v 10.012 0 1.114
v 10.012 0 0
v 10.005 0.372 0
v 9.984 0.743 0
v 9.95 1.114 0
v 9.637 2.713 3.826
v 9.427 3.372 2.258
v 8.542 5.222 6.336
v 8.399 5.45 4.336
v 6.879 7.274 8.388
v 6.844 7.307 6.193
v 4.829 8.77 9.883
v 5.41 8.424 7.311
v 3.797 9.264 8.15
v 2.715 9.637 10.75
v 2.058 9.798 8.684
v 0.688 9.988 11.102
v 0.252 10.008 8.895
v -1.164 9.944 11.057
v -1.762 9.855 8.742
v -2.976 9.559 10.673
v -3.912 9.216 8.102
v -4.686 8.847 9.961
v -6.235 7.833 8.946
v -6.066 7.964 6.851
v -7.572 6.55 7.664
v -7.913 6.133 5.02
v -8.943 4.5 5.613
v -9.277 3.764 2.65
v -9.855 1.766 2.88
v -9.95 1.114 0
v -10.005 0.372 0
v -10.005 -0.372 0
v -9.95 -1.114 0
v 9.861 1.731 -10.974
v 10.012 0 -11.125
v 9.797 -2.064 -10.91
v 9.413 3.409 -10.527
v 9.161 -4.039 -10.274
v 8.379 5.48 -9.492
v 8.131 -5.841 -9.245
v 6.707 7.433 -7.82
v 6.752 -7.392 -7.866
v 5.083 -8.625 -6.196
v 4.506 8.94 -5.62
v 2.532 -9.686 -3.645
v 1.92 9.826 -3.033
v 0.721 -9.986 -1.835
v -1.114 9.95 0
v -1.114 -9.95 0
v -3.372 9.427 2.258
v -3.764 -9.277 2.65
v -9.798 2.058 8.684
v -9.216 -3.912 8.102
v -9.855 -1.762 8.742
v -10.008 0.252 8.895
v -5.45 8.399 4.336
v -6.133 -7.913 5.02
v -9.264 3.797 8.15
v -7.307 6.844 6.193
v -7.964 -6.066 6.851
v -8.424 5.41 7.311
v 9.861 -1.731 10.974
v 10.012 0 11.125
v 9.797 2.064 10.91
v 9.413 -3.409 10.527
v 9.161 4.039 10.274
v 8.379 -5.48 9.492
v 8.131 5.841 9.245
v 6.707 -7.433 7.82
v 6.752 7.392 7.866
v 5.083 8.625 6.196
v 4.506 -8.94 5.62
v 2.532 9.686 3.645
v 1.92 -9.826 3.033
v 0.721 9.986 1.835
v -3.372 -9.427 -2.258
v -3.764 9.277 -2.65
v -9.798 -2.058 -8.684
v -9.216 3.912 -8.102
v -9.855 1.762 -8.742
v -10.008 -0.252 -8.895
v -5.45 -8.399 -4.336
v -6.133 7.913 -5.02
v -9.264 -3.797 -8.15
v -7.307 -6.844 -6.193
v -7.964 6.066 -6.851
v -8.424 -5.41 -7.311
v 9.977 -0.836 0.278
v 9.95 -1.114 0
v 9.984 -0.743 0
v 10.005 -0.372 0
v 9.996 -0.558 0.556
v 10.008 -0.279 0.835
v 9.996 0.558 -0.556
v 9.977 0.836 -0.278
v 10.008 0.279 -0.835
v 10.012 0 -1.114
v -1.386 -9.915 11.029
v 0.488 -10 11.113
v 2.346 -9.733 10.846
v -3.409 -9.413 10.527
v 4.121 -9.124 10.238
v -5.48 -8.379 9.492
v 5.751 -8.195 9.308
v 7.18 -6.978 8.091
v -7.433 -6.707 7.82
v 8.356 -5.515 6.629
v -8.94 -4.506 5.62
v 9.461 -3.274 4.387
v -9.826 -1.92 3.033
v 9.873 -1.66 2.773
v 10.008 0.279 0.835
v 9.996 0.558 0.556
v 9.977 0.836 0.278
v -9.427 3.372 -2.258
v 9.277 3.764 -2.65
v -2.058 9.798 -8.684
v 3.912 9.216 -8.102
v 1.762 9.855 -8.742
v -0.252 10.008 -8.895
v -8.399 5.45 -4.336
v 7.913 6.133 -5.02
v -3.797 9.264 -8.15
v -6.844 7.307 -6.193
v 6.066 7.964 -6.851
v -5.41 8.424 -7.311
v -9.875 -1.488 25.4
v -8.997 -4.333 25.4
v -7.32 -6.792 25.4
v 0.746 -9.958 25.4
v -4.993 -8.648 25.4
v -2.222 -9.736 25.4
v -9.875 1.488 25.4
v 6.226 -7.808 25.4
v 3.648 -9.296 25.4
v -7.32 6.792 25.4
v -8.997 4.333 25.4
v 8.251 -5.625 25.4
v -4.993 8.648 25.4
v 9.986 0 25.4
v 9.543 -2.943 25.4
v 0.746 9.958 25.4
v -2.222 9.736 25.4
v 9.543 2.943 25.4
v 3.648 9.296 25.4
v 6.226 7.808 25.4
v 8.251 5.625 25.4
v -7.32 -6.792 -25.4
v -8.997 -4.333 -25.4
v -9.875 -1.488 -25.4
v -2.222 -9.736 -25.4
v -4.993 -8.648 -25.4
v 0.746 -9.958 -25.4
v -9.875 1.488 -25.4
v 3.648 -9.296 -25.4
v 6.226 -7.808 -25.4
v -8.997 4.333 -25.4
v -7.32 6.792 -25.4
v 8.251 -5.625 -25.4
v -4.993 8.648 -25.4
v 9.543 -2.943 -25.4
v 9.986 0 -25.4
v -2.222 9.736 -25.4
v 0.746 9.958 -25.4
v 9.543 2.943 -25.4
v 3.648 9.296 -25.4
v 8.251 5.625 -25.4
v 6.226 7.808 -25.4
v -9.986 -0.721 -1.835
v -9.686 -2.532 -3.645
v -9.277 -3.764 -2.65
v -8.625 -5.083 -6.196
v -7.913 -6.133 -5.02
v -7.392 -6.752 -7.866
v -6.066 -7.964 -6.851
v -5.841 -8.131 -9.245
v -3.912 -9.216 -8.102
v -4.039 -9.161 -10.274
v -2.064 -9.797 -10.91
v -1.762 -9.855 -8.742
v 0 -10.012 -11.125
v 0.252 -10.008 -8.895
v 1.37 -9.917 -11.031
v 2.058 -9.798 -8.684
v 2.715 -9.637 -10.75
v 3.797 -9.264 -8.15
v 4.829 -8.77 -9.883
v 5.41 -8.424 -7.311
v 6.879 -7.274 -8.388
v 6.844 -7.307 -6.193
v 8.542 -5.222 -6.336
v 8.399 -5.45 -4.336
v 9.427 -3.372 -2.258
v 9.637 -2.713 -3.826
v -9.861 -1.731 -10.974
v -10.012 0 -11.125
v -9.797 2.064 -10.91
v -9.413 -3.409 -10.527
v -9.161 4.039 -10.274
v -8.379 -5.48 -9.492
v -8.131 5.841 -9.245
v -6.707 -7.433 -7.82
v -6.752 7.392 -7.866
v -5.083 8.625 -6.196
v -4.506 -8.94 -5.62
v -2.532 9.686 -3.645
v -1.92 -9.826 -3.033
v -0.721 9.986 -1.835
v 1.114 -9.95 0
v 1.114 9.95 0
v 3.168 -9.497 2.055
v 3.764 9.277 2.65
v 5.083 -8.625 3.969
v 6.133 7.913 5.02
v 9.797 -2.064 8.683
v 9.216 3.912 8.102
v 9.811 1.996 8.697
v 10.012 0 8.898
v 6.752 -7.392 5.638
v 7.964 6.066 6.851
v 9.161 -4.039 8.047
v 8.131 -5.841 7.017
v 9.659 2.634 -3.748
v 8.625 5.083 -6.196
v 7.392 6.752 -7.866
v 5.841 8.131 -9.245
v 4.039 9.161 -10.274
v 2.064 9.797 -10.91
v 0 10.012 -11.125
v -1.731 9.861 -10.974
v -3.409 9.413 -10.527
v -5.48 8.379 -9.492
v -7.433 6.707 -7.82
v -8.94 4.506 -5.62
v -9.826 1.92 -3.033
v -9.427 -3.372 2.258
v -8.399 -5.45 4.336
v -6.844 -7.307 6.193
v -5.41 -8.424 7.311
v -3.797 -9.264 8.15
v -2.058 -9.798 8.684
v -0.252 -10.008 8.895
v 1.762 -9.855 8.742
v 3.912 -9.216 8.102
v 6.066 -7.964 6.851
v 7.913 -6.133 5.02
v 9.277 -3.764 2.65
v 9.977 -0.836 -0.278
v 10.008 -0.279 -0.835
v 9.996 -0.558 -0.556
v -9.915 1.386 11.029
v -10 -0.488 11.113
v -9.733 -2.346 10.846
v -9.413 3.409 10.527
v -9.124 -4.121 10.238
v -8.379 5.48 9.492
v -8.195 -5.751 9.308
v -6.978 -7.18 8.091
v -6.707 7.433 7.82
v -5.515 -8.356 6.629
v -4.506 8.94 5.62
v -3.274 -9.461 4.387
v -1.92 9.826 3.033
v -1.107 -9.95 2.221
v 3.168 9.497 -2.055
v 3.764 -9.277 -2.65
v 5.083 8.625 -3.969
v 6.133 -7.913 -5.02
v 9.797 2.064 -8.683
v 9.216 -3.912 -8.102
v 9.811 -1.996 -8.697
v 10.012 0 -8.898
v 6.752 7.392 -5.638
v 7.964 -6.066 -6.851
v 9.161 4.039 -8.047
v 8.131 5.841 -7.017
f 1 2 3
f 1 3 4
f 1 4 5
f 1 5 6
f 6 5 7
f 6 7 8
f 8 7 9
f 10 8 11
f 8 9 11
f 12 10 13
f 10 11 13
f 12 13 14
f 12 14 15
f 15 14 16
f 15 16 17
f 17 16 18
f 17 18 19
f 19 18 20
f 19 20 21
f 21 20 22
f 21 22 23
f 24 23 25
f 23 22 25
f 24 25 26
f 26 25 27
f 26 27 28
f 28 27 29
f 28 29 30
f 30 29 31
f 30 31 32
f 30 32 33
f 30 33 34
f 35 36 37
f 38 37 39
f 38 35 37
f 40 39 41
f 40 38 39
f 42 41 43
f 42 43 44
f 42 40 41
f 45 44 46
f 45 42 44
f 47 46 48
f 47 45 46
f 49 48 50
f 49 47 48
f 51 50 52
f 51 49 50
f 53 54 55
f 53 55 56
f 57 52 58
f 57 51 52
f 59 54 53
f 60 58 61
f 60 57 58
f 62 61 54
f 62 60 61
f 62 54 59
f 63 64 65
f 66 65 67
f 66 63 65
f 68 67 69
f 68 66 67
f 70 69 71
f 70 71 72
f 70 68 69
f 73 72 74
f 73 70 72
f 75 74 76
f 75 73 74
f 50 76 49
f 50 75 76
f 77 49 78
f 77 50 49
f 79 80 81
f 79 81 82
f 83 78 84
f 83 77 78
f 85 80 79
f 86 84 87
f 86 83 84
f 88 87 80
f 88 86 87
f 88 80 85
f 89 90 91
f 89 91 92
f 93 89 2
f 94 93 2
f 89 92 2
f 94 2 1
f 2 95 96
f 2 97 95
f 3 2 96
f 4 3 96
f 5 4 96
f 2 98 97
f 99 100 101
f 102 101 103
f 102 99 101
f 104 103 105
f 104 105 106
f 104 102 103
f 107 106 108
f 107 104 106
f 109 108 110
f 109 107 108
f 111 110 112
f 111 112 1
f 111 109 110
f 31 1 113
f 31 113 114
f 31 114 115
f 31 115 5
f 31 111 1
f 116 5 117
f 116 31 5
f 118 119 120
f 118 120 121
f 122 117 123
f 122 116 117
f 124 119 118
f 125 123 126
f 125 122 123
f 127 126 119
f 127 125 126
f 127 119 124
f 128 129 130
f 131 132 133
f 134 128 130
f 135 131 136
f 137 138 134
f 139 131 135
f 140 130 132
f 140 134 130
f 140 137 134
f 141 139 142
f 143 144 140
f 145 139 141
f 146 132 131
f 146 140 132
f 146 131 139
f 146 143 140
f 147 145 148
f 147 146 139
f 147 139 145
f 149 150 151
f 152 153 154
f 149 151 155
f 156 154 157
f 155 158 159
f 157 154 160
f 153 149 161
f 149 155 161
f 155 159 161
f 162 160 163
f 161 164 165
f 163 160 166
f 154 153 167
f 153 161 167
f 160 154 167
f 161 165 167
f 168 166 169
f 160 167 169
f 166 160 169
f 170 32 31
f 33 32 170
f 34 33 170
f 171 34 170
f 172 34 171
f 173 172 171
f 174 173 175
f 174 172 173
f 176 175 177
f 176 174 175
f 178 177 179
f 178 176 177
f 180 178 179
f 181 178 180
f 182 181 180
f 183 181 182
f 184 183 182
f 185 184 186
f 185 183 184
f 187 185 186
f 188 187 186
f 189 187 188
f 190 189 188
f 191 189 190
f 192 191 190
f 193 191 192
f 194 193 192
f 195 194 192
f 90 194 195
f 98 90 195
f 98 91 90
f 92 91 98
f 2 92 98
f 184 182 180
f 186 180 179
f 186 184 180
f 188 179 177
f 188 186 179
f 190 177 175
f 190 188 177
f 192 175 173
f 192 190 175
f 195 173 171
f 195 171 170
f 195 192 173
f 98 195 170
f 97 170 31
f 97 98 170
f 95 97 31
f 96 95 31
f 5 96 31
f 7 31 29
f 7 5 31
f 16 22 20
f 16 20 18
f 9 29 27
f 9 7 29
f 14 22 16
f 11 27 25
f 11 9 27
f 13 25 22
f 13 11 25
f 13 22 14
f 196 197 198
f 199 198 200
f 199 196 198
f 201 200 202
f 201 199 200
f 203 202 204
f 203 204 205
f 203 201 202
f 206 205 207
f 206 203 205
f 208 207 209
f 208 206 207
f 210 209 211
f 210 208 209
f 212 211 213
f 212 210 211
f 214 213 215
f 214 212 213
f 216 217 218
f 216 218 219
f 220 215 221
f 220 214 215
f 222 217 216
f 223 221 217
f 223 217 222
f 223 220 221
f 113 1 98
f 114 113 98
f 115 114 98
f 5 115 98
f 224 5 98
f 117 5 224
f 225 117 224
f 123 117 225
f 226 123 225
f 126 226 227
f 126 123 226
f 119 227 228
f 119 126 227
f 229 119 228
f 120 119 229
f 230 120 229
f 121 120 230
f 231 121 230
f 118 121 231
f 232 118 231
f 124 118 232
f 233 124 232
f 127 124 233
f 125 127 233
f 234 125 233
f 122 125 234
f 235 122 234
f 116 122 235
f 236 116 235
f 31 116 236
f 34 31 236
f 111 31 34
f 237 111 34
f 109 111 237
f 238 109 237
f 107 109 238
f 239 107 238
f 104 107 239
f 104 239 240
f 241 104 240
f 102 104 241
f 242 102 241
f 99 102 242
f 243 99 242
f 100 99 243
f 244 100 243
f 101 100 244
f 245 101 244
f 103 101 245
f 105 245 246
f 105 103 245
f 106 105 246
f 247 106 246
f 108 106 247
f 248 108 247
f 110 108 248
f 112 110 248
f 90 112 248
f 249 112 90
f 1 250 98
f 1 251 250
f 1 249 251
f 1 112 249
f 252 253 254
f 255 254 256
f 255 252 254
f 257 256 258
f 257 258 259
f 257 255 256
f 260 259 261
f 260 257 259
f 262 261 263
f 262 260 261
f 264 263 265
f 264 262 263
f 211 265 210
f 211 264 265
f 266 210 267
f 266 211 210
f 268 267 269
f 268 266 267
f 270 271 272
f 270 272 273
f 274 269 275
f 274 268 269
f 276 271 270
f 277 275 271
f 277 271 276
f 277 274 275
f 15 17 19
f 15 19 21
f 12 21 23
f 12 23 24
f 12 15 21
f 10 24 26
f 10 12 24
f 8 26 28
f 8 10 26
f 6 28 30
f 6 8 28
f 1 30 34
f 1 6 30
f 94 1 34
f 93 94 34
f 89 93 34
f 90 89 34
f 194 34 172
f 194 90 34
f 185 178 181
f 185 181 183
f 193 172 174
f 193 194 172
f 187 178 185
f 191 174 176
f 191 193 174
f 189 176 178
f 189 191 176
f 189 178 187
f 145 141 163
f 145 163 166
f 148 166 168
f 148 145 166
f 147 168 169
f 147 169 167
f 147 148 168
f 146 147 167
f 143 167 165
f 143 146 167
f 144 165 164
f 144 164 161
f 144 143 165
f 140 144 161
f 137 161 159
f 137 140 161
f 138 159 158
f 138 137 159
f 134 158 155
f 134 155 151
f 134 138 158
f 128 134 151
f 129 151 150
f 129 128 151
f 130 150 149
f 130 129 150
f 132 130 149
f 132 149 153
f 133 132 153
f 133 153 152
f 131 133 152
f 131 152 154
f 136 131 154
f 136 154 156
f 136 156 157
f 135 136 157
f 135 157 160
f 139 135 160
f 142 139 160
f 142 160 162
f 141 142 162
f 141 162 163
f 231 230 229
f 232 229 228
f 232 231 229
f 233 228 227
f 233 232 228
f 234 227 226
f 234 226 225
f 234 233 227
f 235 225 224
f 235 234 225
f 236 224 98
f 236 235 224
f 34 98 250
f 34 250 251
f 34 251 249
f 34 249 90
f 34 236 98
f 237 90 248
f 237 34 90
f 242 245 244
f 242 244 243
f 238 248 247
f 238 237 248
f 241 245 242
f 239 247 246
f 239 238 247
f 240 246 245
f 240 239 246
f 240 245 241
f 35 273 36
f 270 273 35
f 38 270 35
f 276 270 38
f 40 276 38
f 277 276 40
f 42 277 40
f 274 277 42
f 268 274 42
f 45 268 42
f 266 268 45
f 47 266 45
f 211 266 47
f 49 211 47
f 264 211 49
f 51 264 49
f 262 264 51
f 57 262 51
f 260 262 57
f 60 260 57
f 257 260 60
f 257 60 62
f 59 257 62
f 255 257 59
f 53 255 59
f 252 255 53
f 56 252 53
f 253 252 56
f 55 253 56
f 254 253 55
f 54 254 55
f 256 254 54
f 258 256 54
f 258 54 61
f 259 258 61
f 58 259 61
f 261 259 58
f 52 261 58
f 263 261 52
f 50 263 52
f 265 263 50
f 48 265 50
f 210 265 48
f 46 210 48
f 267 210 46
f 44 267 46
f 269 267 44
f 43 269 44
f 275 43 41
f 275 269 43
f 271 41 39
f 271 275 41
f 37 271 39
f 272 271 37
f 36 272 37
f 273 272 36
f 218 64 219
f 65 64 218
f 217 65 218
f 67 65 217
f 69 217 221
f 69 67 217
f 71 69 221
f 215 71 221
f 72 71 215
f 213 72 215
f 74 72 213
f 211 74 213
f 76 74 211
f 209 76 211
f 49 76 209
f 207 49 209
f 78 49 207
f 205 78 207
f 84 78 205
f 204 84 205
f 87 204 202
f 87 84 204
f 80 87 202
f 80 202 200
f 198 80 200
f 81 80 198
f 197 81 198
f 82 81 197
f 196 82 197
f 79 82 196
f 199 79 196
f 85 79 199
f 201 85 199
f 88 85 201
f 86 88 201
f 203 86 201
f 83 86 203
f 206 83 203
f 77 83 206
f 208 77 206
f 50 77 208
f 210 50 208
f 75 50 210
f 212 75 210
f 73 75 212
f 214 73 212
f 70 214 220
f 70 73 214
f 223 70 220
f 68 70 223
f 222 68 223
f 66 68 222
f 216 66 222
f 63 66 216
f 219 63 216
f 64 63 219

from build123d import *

# Parameters (mm, degrees)
F0_W          = 25.4
F0_H          = 25.4
F1_DEPTH      = 25.4
F3_DEPTH      = 12.7
F5_COUNT      = 4
F6_R          = 20.1833985855
F6_R_2        = 10.011648241
F7_DEPTH      = 25.401
F7_DEPTH_BACK = 25.401
F8_R          = 27.6664771381
F8_R_2        = 9.986248241
F9_DEPTH      = 50.801


with BuildPart() as f1:
    # F0 (on Top) → F1 (new body, symmetric)
    with BuildSketch(Plane.XY):
        Rectangle(F0_W, F0_H)
    extrude(amount=F1_DEPTH, both=True)


with BuildPart() as f3:
    # F2 (on Front) → F3 (new body, symmetric)
    with BuildSketch(Plane.XZ):
        Polygon((13.813551759, 12.7), (12.7, 13.813551759), (-11.1252, -10.011648241), (-10.011648241, -11.1252), align=None)
    extrude(amount=F3_DEPTH, both=True)


with BuildPart() as f5_1:
    # F5: instance of F3
    add(f3.part.rotate(Axis((0, 0, 26.6196299344), (0, 0, 1)), 1 * 360 / F5_COUNT))


with BuildPart() as f5_2:
    # F5: instance of F3
    add(f3.part.rotate(Axis((0, 0, 26.6196299344), (0, 0, 1)), 2 * 360 / F5_COUNT))


with BuildPart() as f5_3:
    # F5: instance of F3
    add(f3.part.rotate(Axis((0, 0, 26.6196299344), (0, 0, 1)), 3 * 360 / F5_COUNT))


with BuildPart() as f7_tool:
    # F6 (on Top) → F7 (new body, two sides)
    with BuildSketch(Plane.XY) as f7_sk:
        Circle(F6_R)
        Circle(F6_R_2, mode=Mode.SUBTRACT)
    extrude(amount=F7_DEPTH)
    extrude(f7_sk.sketch, amount=-F7_DEPTH_BACK)


with BuildPart() as f1_1:
    add(f1.part)

    # F7: cut by f7_tool
    add(f7_tool.part, mode=Mode.SUBTRACT)

    # F8 (on face) → F9 (cut, through all)
    with BuildSketch(Plane.XY.offset(25.4)):
        Circle(F8_R)
        Circle(F8_R_2, mode=Mode.SUBTRACT)
    extrude(amount=-F9_DEPTH, mode=Mode.SUBTRACT)


with BuildPart() as f3_1:
    add(f3.part)

    # F7: cut by f7_tool
    add(f7_tool.part, mode=Mode.SUBTRACT)


with BuildPart() as f5_1_1:
    add(f5_1.part)

    # F7: cut by f7_tool
    add(f7_tool.part, mode=Mode.SUBTRACT)


with BuildPart() as f5_2_1:
    add(f5_2.part)

    # F7: cut by f7_tool
    add(f7_tool.part, mode=Mode.SUBTRACT)


with BuildPart() as f5_3_1:
    add(f5_3.part)

    # F7: cut by f7_tool
    add(f7_tool.part, mode=Mode.SUBTRACT)


solid = Compound([f1_1.part, f3_1.part, f5_1_1.part, f5_2_1.part, f5_3_1.part])
